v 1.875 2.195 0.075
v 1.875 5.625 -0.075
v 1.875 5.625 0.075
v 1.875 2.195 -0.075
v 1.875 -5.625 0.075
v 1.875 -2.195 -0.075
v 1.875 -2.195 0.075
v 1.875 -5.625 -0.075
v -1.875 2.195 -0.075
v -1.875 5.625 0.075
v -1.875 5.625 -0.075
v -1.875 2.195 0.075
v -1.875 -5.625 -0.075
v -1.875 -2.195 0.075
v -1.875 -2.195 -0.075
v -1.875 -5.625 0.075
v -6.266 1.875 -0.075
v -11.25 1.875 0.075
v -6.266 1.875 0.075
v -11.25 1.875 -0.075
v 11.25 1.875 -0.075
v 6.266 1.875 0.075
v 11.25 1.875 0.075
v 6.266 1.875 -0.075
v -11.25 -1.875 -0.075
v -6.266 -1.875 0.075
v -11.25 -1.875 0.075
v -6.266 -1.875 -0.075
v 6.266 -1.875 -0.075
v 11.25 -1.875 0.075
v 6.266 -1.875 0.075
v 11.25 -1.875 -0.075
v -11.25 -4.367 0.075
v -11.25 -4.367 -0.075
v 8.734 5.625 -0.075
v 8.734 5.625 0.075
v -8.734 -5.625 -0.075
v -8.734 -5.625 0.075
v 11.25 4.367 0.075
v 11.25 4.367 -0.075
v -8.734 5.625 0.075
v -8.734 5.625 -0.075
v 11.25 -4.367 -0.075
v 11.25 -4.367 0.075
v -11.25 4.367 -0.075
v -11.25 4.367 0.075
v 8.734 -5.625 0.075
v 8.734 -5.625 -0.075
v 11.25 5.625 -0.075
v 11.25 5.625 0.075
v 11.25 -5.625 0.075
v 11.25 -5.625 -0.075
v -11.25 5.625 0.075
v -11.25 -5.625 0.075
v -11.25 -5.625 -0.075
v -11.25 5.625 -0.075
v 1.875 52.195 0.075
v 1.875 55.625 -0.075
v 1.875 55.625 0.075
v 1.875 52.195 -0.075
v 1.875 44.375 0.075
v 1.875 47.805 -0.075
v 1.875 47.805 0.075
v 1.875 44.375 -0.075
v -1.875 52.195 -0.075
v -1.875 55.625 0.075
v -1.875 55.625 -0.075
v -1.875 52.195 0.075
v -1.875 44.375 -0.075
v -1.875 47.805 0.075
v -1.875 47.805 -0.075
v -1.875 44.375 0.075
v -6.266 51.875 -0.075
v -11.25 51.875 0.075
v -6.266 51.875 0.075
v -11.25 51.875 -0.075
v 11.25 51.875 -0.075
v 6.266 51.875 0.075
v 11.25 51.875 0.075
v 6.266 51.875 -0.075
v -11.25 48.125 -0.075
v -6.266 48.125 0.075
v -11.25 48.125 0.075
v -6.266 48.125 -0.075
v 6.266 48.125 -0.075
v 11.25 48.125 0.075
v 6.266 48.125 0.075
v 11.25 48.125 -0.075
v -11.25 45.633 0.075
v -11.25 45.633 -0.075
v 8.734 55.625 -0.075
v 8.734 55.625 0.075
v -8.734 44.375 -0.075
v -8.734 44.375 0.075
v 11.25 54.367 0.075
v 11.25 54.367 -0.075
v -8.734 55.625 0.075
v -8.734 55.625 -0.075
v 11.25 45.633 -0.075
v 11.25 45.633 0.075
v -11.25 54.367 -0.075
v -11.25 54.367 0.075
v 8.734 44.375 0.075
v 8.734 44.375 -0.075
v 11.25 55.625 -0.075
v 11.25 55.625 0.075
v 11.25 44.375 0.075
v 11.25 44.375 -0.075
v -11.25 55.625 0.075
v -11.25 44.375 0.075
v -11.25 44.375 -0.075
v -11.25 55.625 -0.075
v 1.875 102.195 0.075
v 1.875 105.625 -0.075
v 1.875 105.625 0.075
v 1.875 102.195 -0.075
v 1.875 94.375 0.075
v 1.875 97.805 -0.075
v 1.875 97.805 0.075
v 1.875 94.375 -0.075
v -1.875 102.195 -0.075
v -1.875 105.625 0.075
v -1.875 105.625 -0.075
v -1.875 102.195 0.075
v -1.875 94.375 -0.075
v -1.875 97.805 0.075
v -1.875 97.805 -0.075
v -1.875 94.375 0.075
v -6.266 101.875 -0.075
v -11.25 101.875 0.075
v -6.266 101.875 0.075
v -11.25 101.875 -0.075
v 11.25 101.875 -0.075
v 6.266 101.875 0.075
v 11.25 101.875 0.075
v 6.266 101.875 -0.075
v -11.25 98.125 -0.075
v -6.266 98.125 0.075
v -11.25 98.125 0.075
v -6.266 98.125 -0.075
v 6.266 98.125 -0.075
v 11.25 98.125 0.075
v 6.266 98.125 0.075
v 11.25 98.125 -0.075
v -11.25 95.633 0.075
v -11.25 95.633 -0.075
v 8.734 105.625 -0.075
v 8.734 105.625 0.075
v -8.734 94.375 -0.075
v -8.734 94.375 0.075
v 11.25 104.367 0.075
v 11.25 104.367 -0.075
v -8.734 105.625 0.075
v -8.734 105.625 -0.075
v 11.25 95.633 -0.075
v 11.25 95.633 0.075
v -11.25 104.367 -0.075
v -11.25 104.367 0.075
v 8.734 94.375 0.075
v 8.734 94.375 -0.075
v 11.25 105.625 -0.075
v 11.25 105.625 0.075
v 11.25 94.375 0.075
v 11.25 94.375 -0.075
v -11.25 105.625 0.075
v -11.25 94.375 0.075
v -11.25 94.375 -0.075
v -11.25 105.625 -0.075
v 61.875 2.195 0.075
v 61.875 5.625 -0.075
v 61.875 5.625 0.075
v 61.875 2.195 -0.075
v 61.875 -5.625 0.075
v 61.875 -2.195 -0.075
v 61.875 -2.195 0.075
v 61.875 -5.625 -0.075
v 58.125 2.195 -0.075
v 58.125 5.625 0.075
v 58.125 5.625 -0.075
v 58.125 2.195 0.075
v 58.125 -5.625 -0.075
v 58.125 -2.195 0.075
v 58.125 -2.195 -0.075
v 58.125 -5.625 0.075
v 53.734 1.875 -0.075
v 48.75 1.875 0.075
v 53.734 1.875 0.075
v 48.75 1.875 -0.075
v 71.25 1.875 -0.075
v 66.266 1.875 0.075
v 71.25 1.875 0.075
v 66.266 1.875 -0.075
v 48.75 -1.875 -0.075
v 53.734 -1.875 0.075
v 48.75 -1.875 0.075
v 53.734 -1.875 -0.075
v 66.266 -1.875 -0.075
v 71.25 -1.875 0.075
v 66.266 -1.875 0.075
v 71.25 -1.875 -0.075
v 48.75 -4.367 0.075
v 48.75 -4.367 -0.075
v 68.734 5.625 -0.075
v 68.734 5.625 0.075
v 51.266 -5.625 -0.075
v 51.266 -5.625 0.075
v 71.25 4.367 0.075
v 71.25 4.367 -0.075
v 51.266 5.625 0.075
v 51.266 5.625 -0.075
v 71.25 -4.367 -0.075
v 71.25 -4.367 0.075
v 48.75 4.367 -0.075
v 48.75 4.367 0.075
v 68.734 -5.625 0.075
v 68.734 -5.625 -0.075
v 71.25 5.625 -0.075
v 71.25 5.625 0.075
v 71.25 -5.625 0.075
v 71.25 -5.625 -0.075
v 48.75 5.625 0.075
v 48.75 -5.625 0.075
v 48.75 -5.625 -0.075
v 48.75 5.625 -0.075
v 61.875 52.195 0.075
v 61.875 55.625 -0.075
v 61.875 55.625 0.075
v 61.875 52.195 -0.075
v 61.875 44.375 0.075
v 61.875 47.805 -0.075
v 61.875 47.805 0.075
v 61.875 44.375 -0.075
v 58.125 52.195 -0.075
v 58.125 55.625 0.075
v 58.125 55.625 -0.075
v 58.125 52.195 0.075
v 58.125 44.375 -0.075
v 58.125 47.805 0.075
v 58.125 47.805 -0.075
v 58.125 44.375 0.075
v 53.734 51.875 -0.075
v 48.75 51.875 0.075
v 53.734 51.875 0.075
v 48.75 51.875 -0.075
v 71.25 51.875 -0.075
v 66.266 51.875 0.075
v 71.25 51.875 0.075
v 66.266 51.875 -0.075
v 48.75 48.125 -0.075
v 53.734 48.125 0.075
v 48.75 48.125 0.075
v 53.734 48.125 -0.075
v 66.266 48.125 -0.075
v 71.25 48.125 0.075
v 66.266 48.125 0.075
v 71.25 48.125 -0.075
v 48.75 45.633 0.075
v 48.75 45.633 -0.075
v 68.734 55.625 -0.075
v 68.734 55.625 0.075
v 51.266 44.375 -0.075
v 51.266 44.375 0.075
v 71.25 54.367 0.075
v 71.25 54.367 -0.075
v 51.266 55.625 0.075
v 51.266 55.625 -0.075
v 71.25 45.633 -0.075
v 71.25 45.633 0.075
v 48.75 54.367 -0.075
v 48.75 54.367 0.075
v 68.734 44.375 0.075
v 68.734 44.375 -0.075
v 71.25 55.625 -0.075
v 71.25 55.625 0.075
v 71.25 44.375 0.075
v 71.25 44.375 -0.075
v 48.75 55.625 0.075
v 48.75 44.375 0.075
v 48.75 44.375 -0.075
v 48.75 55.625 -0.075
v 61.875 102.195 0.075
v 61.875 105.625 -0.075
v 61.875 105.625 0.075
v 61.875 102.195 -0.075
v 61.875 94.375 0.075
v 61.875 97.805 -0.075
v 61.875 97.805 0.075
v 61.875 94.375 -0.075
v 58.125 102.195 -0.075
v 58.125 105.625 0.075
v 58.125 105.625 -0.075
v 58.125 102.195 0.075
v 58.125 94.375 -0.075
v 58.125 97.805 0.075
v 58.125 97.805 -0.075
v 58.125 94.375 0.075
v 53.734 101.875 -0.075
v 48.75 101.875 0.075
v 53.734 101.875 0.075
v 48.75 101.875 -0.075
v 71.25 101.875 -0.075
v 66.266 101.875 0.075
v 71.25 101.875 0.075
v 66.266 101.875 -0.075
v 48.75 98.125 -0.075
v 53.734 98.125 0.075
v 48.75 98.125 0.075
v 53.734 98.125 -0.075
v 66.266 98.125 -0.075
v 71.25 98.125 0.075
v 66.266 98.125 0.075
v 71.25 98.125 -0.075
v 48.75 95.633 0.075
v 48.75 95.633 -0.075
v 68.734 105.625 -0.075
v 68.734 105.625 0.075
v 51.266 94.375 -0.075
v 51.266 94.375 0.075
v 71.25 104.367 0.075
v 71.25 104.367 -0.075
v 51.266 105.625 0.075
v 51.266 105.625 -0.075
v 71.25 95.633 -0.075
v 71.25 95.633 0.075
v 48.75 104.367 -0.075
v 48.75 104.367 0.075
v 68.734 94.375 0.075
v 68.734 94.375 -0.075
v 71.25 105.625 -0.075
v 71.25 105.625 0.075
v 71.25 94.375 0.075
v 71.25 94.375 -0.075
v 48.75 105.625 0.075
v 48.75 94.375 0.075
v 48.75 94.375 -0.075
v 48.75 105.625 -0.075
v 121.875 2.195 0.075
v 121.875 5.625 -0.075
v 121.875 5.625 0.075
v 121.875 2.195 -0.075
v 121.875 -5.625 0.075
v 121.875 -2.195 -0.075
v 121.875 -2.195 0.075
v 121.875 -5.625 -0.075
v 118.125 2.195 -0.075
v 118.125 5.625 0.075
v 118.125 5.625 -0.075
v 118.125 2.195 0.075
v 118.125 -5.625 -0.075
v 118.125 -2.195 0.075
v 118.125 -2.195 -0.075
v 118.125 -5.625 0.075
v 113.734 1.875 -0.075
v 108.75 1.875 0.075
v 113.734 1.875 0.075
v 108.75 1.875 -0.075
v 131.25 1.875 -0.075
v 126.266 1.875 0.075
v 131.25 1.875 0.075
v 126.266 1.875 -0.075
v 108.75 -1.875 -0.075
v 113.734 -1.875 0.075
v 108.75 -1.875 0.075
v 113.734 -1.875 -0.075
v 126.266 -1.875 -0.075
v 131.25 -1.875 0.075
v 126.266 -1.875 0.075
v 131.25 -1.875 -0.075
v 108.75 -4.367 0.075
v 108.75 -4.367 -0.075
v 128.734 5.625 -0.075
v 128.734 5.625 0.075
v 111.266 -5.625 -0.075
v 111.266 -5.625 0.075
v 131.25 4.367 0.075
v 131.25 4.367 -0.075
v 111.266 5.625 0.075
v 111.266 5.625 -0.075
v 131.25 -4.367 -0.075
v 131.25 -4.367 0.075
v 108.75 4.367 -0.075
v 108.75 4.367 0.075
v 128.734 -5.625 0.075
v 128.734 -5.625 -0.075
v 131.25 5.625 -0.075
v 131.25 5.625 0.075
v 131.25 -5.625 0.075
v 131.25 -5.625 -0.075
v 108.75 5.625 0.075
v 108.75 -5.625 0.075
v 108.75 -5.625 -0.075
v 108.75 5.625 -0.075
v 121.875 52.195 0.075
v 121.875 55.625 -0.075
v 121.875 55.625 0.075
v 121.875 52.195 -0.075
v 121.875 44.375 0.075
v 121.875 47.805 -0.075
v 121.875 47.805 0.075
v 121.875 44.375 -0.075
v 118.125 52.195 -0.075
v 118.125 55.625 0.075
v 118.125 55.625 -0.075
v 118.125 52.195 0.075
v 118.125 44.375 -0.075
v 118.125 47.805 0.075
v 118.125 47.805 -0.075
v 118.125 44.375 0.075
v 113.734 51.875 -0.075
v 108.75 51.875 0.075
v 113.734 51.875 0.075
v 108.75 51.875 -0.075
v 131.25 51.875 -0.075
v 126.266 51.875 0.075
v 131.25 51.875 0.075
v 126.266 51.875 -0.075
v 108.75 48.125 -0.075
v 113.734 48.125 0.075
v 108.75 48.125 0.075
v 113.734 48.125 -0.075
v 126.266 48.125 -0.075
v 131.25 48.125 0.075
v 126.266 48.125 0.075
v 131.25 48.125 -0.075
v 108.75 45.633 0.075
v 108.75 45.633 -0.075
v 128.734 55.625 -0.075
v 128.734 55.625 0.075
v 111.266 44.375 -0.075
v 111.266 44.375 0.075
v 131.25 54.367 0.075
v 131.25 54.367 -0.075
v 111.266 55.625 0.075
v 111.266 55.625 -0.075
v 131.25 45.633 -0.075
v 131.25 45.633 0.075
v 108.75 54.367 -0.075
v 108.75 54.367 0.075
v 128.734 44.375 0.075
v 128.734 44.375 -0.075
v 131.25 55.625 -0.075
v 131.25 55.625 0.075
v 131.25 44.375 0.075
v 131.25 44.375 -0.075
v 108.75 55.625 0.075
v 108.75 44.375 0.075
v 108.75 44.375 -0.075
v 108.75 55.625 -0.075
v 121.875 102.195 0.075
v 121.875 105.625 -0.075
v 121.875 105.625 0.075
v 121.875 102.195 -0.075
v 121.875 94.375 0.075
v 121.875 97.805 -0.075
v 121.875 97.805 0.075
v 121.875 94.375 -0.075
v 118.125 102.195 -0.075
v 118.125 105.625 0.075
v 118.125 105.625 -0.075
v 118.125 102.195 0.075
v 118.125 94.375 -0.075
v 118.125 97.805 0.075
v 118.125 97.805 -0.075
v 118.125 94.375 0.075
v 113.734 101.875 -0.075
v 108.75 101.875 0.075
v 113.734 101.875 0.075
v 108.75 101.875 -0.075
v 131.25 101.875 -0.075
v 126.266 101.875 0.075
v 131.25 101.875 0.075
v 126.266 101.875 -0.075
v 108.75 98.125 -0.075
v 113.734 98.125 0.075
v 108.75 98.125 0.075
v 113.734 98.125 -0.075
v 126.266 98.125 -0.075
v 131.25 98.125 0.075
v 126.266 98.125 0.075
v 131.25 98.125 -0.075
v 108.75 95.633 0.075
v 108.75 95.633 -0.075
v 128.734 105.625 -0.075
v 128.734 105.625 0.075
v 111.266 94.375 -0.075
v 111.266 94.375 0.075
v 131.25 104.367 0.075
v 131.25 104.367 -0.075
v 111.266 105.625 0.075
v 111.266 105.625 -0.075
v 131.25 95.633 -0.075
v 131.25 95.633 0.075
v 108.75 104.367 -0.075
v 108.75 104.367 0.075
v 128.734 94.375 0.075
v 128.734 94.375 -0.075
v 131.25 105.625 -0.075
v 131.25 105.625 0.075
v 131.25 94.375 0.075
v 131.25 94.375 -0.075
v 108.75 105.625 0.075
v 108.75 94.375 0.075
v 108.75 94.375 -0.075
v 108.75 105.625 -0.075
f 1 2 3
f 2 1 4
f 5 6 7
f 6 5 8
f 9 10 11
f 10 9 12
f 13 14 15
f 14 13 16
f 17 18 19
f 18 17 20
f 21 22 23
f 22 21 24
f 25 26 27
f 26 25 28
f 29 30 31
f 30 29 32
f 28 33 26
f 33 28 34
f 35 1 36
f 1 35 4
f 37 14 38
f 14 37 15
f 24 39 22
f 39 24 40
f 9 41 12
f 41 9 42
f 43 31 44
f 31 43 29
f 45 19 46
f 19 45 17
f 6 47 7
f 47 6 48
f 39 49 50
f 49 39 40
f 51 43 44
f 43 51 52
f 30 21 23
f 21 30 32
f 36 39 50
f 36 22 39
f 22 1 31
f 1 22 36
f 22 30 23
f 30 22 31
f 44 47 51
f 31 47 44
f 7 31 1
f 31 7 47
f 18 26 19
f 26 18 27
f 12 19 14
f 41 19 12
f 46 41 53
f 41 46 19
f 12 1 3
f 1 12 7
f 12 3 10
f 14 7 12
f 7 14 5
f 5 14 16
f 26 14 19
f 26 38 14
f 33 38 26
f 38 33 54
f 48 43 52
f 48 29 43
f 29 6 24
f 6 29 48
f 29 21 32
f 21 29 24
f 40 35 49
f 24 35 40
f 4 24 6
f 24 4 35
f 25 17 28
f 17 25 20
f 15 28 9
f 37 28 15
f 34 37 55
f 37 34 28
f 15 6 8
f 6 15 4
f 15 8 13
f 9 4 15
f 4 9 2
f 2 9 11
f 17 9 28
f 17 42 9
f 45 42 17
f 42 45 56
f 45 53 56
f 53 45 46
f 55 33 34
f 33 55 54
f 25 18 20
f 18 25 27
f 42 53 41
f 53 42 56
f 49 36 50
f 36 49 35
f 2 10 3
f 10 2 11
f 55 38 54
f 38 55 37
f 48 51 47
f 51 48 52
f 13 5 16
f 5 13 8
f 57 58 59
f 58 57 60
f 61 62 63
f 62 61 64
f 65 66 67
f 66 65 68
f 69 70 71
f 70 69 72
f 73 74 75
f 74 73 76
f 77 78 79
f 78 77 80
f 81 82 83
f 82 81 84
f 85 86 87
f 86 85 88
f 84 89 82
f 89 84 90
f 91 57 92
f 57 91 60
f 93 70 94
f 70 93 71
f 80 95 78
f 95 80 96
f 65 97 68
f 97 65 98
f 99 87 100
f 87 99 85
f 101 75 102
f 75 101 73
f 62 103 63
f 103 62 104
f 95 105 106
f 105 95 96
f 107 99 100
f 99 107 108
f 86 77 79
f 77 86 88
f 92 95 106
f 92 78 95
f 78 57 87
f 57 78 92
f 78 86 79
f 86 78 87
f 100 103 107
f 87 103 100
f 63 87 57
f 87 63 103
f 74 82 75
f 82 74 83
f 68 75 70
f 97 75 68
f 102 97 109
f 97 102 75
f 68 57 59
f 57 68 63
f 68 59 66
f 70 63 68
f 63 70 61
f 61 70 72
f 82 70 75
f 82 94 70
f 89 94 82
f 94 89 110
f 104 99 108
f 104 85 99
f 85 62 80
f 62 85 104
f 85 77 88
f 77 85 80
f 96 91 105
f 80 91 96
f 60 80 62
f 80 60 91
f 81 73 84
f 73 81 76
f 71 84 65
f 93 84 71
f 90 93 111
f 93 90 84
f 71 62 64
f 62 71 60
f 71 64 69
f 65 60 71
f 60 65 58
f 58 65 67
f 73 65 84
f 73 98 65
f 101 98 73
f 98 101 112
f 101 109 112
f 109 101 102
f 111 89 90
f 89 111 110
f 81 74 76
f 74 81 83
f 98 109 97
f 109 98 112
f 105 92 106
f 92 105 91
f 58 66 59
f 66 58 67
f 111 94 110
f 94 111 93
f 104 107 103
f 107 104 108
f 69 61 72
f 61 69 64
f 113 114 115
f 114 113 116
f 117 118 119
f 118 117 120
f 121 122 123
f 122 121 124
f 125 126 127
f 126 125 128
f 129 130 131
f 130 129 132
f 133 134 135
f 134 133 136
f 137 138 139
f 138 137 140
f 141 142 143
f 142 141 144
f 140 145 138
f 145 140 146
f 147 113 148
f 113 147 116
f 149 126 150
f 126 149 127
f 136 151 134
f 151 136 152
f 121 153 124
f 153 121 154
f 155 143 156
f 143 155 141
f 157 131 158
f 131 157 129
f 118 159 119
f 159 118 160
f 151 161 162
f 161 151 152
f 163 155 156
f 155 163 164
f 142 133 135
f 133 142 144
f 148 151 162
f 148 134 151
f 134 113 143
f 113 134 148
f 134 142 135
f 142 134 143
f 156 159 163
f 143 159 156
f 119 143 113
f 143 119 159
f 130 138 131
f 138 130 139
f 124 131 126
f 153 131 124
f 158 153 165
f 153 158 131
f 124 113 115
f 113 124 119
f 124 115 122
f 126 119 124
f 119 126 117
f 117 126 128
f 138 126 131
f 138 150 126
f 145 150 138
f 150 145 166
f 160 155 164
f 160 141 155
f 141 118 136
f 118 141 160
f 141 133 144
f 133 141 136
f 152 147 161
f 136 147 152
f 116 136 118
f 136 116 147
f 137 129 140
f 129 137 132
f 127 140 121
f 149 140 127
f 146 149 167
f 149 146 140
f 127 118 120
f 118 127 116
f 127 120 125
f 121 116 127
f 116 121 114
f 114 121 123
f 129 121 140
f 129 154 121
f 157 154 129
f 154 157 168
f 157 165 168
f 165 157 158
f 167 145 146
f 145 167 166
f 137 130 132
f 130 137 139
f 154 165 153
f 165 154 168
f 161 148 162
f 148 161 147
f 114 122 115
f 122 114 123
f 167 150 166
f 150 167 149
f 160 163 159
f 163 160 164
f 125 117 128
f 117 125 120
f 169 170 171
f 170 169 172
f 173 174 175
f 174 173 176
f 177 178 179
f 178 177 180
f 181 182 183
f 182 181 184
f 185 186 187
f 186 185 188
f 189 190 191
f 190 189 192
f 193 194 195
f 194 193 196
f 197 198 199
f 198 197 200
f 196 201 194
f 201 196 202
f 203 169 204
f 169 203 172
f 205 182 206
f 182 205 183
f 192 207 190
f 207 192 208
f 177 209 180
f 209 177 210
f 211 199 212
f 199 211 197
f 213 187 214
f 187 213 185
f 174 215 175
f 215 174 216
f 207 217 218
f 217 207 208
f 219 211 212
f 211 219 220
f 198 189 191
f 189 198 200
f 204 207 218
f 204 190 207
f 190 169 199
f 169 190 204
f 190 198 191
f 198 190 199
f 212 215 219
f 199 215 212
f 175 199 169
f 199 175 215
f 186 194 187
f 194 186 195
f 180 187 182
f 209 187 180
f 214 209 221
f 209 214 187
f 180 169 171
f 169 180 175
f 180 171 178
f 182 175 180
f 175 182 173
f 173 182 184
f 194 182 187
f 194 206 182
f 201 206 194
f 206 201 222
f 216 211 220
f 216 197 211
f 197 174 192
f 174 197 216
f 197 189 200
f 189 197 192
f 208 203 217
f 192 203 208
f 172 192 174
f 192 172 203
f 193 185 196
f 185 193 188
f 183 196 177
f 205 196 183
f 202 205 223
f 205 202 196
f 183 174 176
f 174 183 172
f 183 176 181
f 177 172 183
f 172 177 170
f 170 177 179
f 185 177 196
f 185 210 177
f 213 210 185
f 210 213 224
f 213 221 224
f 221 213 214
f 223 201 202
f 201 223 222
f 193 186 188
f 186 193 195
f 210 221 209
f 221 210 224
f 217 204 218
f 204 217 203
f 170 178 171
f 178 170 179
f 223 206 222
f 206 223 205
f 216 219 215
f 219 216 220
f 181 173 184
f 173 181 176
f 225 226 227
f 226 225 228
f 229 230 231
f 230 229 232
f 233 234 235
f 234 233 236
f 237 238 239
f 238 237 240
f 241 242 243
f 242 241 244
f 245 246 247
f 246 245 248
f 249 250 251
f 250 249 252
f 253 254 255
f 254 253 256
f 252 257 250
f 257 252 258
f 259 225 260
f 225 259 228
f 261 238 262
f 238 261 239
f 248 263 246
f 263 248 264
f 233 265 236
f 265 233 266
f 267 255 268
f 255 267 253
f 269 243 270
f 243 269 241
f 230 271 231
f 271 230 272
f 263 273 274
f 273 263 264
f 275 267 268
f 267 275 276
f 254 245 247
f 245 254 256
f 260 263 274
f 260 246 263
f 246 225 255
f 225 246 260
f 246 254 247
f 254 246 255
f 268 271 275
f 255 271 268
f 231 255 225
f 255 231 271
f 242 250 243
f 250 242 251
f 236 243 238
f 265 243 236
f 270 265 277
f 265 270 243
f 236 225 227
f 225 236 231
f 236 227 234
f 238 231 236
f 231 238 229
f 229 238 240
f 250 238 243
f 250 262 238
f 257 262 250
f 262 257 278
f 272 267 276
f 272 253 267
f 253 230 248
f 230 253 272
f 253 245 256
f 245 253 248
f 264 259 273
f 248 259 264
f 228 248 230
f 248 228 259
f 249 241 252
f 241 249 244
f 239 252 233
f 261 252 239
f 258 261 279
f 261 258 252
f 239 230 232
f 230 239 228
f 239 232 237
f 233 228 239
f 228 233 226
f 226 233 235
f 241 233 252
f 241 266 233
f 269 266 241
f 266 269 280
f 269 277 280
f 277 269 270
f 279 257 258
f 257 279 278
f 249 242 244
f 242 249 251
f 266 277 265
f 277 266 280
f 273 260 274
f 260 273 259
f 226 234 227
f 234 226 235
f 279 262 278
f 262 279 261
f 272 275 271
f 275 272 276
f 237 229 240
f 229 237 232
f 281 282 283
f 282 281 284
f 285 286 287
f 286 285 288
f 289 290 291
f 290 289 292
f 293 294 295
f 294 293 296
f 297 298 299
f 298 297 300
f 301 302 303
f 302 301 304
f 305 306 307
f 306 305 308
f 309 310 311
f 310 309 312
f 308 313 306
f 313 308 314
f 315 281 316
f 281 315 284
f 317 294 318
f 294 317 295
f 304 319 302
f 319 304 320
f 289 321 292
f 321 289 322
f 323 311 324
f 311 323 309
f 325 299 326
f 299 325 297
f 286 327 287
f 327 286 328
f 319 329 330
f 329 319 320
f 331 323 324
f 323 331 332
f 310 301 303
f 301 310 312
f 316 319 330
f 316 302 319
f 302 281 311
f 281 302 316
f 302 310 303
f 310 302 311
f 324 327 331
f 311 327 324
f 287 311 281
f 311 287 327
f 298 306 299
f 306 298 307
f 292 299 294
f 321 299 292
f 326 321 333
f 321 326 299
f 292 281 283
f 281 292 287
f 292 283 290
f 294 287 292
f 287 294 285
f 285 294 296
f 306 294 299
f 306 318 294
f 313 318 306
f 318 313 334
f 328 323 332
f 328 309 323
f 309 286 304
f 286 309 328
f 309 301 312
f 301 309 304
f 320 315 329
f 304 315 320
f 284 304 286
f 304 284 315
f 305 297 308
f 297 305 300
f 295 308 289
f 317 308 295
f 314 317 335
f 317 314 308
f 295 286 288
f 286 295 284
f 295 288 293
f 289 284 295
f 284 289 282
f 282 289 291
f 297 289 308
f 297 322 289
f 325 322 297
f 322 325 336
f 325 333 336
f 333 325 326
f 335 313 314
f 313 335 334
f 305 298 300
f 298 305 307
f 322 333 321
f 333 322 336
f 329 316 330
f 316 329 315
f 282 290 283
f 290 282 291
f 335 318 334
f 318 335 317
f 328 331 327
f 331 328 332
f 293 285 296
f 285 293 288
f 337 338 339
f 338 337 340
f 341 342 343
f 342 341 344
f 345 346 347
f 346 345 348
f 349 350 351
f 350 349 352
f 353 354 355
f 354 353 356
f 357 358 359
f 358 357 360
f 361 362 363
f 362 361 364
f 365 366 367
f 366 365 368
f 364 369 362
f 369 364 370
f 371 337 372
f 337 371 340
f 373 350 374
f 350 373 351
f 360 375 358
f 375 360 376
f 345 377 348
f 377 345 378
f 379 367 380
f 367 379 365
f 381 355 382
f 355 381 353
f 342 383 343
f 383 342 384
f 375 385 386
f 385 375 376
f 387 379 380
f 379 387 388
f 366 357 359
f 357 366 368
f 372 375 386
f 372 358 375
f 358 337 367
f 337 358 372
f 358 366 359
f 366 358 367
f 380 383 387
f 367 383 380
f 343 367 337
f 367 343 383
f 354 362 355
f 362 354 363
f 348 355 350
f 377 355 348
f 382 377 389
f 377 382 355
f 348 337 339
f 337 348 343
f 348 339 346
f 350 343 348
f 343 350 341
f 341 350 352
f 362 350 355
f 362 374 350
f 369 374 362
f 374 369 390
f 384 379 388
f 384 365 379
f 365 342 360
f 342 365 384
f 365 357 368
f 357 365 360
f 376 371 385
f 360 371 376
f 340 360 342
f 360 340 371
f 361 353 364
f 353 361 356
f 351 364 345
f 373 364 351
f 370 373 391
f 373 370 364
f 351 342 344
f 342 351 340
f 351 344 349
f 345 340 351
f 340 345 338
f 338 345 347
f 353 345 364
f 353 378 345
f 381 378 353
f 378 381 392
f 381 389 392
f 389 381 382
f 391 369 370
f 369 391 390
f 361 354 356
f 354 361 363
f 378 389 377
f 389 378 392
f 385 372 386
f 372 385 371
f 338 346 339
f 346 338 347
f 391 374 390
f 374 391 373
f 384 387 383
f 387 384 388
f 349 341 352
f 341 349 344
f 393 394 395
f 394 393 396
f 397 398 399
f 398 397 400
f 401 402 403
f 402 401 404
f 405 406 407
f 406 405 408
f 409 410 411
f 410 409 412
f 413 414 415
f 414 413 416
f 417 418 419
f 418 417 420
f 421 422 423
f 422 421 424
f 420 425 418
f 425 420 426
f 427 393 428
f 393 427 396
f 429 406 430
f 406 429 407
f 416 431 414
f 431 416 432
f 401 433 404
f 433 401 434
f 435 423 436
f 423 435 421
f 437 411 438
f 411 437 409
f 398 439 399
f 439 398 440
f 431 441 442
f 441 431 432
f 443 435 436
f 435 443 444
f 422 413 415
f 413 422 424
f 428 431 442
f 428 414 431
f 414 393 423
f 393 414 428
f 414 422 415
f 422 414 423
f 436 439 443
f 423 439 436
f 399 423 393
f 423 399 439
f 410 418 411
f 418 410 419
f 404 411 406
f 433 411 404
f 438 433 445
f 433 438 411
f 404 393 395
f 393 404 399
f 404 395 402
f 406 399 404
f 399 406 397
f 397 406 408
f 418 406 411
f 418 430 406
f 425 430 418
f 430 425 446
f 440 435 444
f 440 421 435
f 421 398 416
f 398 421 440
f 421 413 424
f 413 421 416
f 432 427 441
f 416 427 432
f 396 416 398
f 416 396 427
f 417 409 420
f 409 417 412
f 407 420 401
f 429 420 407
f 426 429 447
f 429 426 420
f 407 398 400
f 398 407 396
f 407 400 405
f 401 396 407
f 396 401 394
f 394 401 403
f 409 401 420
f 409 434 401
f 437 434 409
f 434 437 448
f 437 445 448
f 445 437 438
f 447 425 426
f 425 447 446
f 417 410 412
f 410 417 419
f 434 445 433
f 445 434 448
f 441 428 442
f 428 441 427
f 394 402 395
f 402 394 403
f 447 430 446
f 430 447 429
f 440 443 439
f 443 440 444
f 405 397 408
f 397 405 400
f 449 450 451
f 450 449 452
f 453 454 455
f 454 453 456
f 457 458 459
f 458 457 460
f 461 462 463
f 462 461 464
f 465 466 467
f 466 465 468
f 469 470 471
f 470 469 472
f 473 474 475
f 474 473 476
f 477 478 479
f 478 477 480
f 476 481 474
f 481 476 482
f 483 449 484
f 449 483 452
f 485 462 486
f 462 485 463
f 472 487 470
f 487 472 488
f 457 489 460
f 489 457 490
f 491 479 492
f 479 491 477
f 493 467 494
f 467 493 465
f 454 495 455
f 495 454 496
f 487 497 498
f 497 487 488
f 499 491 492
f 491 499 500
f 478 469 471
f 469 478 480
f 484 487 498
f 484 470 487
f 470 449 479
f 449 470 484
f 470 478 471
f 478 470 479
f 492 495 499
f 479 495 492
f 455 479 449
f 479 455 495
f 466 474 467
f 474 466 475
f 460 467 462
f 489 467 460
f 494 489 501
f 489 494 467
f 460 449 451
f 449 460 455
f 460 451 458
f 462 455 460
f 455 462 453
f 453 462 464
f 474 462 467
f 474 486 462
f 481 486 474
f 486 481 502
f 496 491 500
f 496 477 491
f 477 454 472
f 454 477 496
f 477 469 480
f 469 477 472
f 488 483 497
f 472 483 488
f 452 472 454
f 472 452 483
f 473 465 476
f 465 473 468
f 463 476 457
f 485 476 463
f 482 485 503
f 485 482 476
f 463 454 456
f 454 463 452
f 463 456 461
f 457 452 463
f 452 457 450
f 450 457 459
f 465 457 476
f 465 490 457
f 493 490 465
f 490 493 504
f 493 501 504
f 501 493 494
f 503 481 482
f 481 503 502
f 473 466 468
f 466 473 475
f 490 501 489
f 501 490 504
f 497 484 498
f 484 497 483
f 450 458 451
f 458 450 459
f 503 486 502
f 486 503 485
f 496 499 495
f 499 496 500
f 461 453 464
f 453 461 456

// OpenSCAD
/*
 * Mult-material test
 *
 * Copyright 2012 <b@Zi.iS>
 * License CC BY 3.0
 *
 */
for(xxx=[0:2]) for(yyy=[0:2]) {
	translate([60*xxx,50*yyy,0])
scale(.75) {
intersection() {
	cube(center=true, [
		30,
		15,
		.2,
	]);
union() {
	cube(center=true, [
		5,
		400,
		1
	]);
	cube(center=true, [
		400,
		5,
		1
	]);
	
	
	rotate([
		0,
		0,
		26.565
	]) {
		cube(center=true, [
			400,
			3,
			1
		]);
	}
	
	rotate([
		0,
		0,
		-26.565
	]) {
		cube(center=true, [
			400,
			3,
			1,
		]);
	}
}
}}
}
